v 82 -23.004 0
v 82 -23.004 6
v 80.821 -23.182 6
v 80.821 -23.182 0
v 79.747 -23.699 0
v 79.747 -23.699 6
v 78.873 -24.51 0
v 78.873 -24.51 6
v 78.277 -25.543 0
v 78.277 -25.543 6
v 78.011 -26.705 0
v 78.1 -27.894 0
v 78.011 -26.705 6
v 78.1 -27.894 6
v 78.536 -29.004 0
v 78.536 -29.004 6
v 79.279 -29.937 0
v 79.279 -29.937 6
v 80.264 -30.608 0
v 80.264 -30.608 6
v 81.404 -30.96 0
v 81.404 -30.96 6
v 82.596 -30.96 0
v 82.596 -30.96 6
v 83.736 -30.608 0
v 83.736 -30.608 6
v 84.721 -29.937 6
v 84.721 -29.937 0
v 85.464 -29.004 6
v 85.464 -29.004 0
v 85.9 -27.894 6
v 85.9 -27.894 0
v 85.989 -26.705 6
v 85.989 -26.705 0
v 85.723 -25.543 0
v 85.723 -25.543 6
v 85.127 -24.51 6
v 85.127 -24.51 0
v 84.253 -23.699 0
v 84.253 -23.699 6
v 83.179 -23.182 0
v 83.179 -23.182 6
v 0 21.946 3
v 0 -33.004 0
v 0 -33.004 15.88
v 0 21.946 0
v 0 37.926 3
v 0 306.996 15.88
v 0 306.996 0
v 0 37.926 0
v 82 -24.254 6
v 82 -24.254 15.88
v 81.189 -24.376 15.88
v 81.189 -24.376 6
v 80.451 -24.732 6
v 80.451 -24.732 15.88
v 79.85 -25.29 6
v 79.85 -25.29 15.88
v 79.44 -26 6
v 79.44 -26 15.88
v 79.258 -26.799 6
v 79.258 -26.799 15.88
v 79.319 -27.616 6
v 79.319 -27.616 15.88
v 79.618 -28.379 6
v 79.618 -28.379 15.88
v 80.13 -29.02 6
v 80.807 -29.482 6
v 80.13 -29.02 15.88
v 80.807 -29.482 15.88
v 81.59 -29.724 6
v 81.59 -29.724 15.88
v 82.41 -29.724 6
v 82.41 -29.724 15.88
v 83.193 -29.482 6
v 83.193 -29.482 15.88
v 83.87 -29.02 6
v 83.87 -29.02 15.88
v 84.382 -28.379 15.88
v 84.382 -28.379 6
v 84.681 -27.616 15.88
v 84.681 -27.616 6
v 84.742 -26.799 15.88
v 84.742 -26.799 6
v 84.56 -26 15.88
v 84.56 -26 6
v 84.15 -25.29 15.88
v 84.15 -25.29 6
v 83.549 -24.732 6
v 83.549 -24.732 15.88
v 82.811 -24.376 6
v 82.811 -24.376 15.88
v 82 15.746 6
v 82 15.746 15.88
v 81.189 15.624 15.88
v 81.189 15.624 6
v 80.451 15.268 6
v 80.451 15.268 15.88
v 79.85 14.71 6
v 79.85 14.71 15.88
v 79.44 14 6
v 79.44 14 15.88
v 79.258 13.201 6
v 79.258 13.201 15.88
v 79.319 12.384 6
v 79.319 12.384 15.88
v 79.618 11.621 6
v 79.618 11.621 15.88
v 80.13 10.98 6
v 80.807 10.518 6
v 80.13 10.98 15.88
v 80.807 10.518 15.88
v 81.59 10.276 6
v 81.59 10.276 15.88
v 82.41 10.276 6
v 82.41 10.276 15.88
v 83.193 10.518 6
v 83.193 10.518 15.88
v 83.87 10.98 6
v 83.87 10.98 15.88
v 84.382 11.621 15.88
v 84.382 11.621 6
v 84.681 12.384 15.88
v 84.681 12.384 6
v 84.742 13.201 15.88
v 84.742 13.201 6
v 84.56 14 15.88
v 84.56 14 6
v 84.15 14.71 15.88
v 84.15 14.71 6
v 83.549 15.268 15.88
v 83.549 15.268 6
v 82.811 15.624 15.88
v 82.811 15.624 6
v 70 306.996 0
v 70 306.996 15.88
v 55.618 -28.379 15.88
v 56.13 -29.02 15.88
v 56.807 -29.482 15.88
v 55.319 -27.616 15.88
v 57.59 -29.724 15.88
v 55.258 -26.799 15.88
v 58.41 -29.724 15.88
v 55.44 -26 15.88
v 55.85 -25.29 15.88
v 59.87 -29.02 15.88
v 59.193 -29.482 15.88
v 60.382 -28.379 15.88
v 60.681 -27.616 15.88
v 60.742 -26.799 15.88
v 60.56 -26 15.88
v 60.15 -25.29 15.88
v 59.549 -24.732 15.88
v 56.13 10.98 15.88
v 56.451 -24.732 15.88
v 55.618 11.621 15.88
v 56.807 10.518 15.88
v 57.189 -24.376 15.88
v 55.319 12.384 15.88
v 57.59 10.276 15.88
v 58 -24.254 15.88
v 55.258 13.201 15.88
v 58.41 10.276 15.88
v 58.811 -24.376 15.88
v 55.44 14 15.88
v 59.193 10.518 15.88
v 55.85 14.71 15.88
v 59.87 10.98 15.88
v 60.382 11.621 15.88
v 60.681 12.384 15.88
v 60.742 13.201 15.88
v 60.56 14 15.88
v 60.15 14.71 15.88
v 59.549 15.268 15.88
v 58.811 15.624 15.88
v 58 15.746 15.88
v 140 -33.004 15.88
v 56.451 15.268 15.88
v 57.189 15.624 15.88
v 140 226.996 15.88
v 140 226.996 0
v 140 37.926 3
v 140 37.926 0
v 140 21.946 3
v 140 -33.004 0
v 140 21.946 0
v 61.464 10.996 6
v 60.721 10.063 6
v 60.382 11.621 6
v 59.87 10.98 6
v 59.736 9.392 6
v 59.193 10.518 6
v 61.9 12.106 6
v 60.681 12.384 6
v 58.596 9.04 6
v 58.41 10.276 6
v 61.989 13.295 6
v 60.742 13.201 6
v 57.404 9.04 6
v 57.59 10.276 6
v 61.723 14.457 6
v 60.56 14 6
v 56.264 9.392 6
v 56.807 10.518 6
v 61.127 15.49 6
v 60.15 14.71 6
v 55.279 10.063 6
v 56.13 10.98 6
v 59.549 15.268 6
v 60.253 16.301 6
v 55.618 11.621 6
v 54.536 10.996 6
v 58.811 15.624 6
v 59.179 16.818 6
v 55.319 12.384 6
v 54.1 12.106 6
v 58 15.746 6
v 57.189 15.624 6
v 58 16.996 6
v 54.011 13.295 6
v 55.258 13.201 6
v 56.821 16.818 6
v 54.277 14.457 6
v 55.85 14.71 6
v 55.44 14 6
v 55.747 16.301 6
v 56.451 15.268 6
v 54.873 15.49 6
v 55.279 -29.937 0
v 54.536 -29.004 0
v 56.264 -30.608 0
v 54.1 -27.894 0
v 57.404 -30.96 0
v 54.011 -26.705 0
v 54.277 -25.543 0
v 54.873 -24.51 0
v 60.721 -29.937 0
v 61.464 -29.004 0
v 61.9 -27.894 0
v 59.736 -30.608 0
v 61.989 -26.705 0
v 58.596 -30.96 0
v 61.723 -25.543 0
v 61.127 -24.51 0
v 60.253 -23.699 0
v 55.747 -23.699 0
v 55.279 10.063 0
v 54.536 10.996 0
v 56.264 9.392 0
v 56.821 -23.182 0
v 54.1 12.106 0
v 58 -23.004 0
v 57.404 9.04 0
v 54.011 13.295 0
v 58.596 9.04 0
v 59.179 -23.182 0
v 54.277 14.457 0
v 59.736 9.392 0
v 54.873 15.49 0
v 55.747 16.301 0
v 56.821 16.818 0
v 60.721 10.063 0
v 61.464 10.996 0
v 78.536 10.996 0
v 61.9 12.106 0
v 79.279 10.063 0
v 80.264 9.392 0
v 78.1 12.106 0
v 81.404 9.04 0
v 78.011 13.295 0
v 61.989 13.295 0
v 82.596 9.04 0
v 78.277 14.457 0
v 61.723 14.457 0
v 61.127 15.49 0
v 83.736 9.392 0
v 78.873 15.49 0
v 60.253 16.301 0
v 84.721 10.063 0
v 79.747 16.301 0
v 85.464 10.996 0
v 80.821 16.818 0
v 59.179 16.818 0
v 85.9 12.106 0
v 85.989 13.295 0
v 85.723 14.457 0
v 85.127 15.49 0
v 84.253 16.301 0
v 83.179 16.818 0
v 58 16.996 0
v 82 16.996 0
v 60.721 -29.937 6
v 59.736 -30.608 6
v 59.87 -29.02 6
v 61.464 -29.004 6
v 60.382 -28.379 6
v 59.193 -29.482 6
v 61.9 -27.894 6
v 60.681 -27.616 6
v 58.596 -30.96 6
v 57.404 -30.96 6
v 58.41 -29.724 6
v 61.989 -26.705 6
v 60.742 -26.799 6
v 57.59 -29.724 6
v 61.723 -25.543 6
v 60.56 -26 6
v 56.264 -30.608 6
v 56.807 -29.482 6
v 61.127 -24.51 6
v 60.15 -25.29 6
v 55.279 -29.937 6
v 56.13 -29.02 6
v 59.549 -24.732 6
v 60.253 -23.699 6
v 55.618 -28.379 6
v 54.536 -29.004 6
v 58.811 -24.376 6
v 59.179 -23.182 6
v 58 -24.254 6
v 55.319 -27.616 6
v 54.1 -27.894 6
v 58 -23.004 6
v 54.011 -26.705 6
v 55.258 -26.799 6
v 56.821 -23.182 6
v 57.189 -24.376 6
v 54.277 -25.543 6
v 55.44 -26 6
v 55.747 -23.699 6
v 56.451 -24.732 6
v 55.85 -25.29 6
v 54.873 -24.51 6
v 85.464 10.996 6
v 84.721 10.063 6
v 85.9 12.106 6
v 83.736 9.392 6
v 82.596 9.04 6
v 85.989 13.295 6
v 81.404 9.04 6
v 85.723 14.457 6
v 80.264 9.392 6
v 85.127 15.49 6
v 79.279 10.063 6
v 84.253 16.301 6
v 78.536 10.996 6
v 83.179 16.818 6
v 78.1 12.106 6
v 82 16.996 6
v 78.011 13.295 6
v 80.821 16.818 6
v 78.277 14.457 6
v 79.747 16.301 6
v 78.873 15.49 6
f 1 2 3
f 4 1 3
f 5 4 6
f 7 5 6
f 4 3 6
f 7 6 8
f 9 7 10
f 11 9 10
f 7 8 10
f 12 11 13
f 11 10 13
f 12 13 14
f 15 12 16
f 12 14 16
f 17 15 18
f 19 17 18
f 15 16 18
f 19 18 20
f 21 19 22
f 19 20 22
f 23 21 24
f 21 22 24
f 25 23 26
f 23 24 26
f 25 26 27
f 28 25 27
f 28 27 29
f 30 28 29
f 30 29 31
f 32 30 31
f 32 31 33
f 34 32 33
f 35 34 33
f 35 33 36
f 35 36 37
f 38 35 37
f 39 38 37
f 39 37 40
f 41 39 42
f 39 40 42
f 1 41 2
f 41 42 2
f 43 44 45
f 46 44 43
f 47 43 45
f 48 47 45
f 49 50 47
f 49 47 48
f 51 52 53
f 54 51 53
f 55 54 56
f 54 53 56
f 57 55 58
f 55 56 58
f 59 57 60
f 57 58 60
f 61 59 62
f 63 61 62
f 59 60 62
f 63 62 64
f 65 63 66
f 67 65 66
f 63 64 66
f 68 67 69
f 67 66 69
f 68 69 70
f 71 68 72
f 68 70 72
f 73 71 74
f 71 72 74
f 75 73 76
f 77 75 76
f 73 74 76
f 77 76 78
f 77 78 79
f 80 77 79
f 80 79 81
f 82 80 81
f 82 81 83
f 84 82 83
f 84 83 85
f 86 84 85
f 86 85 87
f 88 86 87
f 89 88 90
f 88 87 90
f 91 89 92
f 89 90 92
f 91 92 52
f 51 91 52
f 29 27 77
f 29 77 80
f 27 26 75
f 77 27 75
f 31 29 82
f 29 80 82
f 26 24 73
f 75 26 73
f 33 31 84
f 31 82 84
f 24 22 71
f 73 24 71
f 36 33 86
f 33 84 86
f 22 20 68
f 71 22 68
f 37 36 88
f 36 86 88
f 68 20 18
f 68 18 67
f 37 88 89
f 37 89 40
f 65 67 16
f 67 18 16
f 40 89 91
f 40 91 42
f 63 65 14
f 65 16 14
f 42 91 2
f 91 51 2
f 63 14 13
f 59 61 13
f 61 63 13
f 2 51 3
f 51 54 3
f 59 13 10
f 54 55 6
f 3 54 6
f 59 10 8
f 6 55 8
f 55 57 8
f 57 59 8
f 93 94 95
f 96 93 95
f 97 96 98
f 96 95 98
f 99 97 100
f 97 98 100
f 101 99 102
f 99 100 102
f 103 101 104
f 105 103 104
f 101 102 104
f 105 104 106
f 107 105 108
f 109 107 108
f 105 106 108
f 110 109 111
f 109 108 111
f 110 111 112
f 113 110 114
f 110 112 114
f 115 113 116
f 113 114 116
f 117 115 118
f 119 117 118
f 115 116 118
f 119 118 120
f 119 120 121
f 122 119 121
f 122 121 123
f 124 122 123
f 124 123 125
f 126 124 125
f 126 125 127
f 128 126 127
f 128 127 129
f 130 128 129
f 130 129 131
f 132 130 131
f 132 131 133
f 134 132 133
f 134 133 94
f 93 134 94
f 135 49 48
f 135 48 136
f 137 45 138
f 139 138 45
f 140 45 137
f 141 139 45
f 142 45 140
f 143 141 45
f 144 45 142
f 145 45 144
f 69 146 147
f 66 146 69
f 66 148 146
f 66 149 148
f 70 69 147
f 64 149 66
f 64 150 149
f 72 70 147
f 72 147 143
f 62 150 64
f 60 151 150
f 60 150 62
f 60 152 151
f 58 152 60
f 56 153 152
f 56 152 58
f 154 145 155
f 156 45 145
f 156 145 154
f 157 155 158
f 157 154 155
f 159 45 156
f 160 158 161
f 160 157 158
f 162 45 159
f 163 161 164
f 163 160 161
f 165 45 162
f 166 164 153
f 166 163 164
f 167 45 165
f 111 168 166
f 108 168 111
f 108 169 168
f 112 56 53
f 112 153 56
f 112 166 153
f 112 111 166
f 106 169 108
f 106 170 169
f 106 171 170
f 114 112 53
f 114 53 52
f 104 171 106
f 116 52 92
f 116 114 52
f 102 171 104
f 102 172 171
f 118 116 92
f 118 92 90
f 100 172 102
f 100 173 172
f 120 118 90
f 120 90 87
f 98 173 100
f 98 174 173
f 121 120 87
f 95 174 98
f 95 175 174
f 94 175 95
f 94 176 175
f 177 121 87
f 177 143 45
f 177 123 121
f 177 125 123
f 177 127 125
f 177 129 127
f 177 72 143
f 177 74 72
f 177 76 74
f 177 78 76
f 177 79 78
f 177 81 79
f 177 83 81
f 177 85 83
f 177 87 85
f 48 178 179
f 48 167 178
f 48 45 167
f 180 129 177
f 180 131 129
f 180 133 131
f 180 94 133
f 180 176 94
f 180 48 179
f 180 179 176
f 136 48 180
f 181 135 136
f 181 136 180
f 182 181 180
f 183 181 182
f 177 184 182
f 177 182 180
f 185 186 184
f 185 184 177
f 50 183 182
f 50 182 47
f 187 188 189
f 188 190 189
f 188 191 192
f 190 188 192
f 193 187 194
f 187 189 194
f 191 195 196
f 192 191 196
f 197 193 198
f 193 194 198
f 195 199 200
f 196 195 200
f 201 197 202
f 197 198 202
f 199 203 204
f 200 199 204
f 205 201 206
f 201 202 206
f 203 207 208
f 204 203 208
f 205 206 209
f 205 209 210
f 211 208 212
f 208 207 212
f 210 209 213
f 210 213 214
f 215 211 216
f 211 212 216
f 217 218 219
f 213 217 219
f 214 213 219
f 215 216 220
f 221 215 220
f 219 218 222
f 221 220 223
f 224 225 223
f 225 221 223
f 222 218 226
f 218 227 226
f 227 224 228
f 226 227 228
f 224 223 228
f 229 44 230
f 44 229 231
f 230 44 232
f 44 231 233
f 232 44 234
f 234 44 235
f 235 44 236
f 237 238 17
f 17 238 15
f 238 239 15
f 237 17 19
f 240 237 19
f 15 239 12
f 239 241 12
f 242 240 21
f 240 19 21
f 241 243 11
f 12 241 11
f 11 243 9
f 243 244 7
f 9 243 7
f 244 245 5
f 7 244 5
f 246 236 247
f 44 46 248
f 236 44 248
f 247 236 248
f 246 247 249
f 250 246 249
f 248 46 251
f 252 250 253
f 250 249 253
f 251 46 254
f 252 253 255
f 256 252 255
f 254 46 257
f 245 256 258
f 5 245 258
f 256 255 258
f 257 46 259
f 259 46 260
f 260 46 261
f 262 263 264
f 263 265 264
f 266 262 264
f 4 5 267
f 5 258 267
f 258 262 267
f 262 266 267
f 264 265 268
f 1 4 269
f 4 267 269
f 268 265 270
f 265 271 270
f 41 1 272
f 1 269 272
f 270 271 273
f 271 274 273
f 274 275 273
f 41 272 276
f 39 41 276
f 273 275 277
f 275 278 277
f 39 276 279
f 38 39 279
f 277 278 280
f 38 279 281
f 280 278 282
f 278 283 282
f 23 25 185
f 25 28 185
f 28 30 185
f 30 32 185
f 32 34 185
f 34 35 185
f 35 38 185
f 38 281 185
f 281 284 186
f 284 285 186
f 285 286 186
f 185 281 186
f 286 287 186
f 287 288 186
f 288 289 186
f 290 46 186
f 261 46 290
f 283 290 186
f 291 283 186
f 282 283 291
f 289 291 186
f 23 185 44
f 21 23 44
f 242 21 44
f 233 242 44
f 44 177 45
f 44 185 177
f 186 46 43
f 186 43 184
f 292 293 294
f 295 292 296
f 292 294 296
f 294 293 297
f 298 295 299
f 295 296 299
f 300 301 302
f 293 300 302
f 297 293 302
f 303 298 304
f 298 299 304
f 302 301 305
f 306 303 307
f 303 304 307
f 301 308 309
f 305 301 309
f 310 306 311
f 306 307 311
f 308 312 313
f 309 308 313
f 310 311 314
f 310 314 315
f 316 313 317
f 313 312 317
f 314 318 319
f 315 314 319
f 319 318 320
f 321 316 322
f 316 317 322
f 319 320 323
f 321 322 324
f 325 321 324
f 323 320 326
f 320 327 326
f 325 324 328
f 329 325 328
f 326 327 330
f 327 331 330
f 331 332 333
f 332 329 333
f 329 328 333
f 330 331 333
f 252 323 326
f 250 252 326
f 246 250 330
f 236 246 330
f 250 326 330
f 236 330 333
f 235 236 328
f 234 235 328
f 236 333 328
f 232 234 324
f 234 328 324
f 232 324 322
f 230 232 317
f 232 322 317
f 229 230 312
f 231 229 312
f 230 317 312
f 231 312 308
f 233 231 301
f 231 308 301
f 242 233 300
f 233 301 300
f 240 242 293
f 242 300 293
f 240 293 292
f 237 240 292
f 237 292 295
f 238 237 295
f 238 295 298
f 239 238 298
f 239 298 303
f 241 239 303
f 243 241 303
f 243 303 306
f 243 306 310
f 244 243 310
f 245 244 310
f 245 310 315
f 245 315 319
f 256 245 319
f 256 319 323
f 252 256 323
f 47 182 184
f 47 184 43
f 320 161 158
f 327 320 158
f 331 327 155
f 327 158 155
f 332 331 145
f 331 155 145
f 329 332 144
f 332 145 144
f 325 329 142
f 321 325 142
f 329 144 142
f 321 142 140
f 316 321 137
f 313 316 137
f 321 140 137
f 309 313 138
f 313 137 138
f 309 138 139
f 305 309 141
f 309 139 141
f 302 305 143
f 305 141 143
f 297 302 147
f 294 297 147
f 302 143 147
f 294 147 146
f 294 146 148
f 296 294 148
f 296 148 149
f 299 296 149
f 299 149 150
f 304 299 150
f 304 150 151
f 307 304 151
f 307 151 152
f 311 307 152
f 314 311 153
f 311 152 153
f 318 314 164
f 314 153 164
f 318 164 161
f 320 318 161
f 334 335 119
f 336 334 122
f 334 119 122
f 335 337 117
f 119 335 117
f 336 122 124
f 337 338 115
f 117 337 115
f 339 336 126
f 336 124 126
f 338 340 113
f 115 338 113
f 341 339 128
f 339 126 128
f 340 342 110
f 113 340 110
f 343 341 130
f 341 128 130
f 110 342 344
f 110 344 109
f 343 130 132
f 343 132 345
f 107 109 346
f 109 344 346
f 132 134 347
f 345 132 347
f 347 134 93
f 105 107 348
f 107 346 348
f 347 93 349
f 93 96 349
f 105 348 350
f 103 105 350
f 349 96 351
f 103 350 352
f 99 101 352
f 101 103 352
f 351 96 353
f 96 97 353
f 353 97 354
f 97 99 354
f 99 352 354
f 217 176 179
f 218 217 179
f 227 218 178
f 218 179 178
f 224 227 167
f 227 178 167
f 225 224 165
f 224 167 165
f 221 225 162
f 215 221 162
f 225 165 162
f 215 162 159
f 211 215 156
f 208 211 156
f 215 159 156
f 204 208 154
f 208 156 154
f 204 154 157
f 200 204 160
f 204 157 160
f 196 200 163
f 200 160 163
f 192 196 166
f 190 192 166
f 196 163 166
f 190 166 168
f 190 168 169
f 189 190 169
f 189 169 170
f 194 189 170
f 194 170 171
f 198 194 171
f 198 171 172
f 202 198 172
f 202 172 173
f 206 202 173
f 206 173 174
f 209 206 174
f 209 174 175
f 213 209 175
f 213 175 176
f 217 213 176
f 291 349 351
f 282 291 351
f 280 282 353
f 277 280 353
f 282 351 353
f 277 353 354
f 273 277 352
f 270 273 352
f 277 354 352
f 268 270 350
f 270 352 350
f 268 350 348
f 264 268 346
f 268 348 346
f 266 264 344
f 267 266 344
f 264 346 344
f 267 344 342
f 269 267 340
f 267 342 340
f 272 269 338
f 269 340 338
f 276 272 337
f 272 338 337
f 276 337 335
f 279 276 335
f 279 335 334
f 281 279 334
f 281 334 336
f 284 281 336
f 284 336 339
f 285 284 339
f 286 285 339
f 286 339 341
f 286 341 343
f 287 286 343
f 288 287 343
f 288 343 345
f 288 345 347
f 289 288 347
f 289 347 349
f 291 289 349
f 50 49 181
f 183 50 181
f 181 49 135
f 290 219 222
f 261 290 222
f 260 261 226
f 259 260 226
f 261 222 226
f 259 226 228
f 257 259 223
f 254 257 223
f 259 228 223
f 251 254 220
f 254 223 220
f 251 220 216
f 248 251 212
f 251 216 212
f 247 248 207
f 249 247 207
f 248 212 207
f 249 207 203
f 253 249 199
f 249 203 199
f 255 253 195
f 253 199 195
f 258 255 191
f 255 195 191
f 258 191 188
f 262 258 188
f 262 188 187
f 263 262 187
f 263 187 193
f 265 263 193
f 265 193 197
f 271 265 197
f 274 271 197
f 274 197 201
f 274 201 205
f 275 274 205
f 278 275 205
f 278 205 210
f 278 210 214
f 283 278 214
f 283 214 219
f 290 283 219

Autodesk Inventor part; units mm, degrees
ref_plane "YZ Plane" through (0, 0, 0) normal (1, 0, 0) x (0, 1, 0)
ref_plane "XZ Plane" through (0, 0, 0) normal (0, 1, 0) x (-1, 0, 0)
ref_plane "XY Plane" through (0, 0, 0) normal (0, 0, 1) x (1, 0, 0)
sketch "Esboço1" plane through (0, 0, 0) normal (0, 0, 1) x (1, 0, 0)
  line L0 (0, 306.9957) -> (70, 306.9957)
  line L1 (140, 226.9957) -> (140, -33.0043)
  line L2 (140, -33.0043) -> (0, -33.0043)
  line L3 (0, -33.0043) -> (0, 306.9957)
  line L4 (70, 306.9957) -> (140, 226.9957)
  dimension "d0" = 140
  dimension "d1" = 340
  dimension "d2" = 70
  dimension "d3" = 260
extrude "Extrusão1" add sketch "Esboço1" along normal blind 15.88
sketch "Esboço3" plane through (0, 0, 0) normal (0, 0, -1) x (-1, 0, 0)
  line L0 (0, 21.9457) -> (-140, 21.9457)
  line L1 (0, 21.9457) -> (0, 37.9257)
  line L2 (-140, 37.9257) -> (0, 37.9257)
  line L3 (-140, 21.9457) -> (-140, 37.9257)
  line L4 (-140, -33.0043) -> (-140, 226.9957) construction
  line L5 (-140, 29.9357) -> (0, 29.9357) construction
  point P0 (0, 0)
  dimension "d11" = 15.98
extrude "Extrusão3" cut sketch "Esboço3" against normal blind 3
sketch "Esboço4" plane through (0, 0, 0) normal (0, 0, -1) x (-1, 0, 0)
  circle A0 centre (-82, 12.9957) radius 2.1
  circle A1 centre (-82, 12.9957) radius 2.1
  circle A2 centre (-58, 12.9957) radius 2.1
  circle A3 centre (-58, -27.0043) radius 2.1
  circle A4 centre (-82, -27.0043) radius 2.1
  point P0 (0, 0)
hole "Furo1" at (82, 12.9957, 0) at (82, 12.9957, 0) at (58, 12.9957, 0) at (58, -27.0043, 0) at (82, -27.0043, 0) direction (0, 0, 1) diameter 5.5 end through all counterbore diameter 8 counterbore depth 6
properties part number "LATERAL_BLOCOS_BASE"
